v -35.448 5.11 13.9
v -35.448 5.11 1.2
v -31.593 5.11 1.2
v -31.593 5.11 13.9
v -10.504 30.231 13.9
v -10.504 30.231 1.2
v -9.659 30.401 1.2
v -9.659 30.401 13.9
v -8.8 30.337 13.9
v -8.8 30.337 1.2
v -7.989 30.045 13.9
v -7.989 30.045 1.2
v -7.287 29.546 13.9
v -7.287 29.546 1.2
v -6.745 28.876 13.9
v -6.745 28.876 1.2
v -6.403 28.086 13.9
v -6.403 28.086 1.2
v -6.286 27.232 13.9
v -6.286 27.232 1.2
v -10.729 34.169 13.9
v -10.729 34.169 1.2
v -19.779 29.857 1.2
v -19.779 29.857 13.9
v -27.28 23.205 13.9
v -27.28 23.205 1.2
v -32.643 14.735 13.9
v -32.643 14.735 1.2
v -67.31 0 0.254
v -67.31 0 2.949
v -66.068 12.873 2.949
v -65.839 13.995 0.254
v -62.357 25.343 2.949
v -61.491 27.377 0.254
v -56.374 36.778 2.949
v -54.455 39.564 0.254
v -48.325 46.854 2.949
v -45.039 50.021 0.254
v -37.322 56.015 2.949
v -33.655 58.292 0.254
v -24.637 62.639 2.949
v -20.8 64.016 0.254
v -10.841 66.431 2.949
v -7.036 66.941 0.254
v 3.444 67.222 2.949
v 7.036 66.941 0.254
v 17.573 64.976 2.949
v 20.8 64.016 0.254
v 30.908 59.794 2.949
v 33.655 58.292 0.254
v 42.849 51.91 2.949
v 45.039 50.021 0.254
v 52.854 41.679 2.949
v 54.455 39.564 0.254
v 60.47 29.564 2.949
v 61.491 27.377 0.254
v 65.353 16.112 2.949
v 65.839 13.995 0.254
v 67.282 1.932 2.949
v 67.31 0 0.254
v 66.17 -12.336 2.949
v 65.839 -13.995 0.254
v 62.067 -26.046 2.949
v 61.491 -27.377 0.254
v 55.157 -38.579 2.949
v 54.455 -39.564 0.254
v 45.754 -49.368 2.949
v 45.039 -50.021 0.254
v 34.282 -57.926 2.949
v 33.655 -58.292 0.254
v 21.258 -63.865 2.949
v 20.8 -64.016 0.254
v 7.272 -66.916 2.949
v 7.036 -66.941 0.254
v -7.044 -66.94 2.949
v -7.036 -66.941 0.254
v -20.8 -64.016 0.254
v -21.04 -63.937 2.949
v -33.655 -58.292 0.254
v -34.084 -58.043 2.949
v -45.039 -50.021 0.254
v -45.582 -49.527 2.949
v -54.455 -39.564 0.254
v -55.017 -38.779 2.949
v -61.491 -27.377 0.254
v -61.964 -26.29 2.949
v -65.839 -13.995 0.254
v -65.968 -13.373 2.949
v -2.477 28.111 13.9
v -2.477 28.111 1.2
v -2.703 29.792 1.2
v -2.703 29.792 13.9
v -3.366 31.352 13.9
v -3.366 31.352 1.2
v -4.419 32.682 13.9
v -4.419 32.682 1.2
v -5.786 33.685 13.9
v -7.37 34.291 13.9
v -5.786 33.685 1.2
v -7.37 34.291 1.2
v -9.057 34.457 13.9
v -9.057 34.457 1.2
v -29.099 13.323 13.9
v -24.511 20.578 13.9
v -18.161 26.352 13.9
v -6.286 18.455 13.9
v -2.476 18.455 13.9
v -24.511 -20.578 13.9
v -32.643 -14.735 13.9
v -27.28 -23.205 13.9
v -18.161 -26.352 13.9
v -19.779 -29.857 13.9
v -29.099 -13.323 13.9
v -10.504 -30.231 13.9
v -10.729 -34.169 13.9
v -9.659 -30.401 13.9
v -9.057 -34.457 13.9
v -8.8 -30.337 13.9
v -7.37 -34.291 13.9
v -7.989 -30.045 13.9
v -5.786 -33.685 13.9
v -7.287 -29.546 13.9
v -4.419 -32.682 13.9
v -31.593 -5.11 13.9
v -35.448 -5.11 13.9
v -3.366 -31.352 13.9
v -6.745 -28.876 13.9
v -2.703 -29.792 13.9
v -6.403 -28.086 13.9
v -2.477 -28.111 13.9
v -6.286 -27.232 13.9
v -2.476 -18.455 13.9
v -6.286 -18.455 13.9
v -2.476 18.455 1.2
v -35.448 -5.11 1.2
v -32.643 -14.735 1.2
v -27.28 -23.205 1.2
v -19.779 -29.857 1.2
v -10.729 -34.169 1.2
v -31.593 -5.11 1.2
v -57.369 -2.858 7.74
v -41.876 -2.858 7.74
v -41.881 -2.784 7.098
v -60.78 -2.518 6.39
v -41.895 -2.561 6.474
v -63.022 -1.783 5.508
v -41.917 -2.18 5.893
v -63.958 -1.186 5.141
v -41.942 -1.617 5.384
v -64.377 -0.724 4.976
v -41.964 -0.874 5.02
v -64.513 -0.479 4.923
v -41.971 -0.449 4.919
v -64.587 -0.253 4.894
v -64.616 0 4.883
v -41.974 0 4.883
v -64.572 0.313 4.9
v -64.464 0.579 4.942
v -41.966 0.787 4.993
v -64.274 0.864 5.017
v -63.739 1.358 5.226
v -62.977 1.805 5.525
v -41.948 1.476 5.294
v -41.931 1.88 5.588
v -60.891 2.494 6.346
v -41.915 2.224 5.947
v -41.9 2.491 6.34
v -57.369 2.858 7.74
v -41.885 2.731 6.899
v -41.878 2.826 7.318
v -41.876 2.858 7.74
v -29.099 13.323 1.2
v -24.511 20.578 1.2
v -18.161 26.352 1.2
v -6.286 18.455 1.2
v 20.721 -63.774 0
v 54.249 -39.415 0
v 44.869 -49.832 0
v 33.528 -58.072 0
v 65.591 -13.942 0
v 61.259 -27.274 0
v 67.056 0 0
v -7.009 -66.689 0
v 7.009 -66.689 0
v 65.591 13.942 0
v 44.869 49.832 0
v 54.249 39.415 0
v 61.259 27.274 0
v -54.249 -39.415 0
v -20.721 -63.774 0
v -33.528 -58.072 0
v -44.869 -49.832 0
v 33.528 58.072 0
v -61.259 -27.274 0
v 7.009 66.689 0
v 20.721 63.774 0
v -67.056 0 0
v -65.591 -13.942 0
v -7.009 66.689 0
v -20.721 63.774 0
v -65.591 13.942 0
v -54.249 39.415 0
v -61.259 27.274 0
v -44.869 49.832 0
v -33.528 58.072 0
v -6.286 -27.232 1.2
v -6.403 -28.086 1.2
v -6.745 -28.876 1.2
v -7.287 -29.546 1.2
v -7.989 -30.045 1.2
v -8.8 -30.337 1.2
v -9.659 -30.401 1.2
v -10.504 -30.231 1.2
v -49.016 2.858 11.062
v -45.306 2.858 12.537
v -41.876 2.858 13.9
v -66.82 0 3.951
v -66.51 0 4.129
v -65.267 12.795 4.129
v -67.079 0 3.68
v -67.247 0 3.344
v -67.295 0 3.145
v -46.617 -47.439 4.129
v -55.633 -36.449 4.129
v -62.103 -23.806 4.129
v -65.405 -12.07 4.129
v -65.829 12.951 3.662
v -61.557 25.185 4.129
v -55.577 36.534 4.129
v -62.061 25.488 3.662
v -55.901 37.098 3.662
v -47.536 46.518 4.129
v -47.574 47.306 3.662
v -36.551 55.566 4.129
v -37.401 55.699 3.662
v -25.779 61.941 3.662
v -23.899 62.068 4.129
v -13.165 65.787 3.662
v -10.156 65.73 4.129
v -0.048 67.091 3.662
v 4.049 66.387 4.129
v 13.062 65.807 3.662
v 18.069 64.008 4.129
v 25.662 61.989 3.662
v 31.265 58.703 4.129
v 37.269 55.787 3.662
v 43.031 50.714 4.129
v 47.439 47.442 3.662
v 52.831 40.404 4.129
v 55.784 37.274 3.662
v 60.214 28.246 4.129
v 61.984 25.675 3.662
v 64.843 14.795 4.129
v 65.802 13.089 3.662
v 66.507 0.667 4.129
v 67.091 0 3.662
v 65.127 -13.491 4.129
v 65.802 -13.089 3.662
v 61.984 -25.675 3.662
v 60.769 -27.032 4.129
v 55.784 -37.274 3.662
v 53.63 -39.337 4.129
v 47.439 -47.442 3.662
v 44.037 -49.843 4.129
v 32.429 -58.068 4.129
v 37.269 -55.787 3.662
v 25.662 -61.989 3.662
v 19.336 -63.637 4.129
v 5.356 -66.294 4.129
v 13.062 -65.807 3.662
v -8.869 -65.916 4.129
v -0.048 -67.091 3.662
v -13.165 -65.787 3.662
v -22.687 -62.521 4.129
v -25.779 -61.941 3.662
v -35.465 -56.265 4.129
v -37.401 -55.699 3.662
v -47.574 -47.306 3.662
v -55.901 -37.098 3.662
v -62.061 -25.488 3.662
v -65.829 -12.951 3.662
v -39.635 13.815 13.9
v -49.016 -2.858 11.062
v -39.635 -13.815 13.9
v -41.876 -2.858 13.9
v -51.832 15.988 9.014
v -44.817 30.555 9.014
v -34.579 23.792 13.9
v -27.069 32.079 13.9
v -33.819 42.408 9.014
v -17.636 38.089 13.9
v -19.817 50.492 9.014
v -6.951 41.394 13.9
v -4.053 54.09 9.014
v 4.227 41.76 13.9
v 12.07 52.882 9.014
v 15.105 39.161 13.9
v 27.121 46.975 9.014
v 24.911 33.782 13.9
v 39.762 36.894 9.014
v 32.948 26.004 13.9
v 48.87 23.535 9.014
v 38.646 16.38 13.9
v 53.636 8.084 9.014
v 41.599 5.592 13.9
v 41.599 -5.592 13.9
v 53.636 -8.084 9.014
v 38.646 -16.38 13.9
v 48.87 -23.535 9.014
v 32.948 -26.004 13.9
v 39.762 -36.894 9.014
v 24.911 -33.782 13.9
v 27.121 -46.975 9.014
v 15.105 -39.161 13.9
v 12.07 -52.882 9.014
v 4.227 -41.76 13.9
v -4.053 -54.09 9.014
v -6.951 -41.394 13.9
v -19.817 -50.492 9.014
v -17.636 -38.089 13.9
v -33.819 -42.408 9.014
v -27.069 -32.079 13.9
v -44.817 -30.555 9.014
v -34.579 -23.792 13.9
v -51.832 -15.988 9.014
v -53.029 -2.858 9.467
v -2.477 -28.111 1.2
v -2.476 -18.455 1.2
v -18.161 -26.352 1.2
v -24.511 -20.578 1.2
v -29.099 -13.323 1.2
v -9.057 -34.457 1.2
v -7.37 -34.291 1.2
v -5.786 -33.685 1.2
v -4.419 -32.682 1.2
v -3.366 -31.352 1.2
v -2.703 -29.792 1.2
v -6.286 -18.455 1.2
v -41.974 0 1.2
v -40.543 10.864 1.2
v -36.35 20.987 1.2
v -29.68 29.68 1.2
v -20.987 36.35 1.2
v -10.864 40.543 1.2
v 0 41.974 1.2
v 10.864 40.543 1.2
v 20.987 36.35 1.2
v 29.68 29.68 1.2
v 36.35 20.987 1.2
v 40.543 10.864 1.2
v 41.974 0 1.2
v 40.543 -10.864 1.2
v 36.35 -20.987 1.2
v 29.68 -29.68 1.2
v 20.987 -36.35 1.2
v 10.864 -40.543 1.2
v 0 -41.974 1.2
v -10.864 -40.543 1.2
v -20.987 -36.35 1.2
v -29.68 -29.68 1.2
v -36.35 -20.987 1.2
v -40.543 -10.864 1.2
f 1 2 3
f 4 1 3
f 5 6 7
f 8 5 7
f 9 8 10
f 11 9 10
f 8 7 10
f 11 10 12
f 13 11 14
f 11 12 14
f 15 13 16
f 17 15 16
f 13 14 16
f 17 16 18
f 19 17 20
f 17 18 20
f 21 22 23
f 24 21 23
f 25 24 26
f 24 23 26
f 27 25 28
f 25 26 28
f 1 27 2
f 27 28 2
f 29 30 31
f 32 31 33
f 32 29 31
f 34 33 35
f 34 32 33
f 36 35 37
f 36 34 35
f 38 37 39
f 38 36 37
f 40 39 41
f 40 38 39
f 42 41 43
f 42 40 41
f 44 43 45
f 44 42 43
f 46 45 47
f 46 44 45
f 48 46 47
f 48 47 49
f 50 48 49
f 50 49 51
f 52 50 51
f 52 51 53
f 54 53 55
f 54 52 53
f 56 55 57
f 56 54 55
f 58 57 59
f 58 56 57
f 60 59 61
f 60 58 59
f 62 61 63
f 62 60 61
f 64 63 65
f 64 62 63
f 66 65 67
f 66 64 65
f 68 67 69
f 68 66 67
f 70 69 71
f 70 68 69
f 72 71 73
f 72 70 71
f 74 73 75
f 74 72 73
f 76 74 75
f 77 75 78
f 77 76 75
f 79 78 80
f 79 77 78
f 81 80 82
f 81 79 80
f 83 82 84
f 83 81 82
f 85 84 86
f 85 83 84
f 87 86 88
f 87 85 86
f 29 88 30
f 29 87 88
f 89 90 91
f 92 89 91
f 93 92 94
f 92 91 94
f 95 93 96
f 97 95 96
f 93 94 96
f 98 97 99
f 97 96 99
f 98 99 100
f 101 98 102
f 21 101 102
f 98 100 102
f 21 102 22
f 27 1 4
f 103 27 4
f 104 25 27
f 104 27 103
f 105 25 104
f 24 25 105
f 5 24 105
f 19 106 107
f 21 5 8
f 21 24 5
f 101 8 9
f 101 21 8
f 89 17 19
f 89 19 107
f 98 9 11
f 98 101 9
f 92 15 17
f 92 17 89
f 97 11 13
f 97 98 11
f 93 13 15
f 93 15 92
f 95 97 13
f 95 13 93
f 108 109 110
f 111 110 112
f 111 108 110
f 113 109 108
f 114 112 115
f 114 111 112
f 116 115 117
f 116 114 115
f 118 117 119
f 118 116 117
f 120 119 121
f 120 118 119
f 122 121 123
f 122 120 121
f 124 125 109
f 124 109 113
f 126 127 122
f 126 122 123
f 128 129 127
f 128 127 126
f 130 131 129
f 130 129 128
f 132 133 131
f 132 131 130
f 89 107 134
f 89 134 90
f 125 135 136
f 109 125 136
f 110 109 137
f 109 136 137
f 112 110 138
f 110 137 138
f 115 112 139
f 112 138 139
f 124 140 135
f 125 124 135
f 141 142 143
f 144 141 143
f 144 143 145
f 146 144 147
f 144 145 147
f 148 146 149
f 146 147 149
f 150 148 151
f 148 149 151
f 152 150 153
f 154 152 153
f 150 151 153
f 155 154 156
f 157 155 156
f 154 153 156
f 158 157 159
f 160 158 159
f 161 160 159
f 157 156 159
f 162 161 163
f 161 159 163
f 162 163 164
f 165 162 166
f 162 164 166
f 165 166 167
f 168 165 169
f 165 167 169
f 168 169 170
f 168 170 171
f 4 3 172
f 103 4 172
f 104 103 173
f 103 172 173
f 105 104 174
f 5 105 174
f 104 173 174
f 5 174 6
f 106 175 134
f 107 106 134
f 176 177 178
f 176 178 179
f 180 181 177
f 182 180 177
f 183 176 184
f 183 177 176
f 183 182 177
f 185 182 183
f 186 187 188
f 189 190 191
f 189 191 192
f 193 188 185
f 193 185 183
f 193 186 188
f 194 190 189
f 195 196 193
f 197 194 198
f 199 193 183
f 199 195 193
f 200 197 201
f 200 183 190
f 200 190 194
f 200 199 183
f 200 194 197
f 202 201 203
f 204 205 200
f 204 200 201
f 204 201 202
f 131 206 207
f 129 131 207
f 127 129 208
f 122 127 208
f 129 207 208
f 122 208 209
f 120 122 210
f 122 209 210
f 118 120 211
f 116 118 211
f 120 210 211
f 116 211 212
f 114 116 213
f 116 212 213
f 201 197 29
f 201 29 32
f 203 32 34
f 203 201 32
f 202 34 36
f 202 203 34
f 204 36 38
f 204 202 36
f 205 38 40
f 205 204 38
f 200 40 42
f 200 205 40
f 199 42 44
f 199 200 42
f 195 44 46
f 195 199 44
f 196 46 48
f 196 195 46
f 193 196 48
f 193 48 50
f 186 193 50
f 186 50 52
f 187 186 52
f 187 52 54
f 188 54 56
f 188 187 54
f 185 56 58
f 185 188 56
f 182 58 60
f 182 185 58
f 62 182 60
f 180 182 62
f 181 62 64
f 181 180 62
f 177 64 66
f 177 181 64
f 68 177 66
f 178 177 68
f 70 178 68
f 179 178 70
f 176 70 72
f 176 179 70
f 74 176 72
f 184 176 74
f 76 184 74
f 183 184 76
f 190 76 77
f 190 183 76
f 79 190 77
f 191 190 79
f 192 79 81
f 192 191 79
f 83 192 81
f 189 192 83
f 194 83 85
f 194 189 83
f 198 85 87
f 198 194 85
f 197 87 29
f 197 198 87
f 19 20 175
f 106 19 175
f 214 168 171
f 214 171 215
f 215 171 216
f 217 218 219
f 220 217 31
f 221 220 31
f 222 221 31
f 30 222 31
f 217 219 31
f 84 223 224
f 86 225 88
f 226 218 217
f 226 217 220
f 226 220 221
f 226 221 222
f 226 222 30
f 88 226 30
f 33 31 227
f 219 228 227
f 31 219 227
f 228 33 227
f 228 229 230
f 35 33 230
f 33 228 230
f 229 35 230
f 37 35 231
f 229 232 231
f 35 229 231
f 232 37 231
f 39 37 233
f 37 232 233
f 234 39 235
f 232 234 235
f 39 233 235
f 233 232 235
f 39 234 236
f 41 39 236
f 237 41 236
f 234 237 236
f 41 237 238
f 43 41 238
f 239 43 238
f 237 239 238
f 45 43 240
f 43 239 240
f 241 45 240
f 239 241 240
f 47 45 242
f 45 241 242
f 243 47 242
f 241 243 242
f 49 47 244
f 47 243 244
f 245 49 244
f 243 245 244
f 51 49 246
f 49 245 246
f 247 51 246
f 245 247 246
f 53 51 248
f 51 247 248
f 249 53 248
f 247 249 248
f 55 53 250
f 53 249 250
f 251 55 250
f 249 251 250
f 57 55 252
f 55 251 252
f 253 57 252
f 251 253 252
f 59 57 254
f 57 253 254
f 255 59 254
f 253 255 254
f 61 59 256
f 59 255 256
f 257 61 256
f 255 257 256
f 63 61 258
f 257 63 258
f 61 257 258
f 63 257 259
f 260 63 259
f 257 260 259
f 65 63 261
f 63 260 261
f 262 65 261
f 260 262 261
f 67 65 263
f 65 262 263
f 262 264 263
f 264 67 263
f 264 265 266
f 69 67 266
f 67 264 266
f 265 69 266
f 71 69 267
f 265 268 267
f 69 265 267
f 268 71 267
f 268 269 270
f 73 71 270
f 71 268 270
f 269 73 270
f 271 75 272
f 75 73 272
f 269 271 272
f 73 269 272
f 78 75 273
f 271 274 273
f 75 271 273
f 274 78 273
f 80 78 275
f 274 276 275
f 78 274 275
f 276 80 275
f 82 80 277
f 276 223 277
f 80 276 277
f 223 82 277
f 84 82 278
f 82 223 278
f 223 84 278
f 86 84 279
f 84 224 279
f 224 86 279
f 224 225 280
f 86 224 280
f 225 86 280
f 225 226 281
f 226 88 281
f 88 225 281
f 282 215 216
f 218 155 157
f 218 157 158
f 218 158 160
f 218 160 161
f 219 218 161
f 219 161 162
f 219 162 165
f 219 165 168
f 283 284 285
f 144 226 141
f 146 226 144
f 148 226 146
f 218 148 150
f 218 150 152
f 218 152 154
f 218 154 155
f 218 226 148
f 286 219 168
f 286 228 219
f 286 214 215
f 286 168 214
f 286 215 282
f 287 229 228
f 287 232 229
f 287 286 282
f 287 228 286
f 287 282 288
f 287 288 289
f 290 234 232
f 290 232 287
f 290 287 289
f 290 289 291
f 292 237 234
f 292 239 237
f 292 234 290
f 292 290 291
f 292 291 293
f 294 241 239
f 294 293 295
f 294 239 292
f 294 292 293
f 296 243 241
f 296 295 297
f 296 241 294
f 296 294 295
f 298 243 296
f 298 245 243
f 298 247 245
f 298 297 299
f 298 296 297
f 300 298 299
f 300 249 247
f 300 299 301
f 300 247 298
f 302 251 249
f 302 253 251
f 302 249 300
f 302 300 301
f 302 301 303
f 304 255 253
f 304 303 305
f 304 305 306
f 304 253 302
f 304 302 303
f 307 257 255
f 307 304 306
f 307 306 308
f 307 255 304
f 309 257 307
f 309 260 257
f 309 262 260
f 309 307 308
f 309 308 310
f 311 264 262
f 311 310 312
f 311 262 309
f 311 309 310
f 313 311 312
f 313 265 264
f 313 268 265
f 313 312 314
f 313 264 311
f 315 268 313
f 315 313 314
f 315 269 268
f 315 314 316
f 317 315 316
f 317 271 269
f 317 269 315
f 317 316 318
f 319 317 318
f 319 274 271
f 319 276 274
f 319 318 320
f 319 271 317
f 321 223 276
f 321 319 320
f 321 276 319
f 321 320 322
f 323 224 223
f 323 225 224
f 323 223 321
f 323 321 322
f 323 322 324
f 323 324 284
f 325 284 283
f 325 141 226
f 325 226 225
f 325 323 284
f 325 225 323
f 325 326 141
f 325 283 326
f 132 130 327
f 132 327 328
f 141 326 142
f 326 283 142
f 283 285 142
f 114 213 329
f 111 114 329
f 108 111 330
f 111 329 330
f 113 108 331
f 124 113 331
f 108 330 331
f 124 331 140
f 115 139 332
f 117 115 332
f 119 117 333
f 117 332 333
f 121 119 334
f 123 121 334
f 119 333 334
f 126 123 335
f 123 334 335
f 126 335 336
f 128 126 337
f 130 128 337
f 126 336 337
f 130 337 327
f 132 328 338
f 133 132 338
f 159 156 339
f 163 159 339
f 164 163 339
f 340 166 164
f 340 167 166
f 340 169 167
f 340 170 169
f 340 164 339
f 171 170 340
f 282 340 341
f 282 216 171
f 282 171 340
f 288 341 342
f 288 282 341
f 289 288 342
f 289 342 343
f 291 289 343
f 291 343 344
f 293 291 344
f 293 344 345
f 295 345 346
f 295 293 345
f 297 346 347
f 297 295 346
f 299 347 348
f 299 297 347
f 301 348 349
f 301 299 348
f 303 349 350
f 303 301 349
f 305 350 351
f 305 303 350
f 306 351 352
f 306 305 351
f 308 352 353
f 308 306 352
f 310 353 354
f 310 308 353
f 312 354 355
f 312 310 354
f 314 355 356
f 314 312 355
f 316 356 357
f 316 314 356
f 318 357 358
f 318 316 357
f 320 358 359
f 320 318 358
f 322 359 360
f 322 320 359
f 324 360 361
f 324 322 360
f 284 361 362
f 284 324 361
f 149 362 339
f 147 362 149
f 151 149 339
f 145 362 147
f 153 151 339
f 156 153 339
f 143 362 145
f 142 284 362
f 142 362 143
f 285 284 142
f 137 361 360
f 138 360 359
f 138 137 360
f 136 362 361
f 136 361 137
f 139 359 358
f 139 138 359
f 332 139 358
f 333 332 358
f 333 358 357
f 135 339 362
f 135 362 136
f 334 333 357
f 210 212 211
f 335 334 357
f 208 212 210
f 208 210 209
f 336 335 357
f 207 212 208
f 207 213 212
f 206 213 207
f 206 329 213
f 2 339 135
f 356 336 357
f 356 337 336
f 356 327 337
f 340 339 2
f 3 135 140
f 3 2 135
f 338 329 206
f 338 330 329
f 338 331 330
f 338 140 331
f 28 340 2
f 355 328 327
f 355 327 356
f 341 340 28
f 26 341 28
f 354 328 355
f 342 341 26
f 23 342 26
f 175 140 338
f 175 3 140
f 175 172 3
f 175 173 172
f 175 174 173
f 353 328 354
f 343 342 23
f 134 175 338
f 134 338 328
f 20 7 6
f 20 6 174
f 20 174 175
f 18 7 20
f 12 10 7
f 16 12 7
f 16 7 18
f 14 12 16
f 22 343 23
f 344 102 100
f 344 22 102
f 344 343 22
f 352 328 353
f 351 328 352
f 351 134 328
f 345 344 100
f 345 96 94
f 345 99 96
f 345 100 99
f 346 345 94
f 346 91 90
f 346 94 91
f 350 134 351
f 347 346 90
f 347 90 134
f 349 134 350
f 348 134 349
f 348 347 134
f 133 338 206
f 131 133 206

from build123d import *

# Parameters (mm, degrees)
F2_R     = 1.27
F4_DEPTH = 12.7
F6_DEPTH = 127
F7_SIZE  = 0.254


with BuildPart() as f1:
    # F0 (on Front) → F1 (revolve)
    with BuildSketch(Plane.XZ):
        Polygon((-67.31, 0), (0, 0), (0, 1.2), (-41.9735, 1.2), (-41.9735, 13.9), (-67.31, 3.81), align=None)
    revolve(axis=Axis((0, 0, 6.192707), (0, 0, -1)))

    # F2
    f2_edges = [f1.edges().sort_by_distance(p)[0] for p in [
        (67.31, 0, 3.81),
    ]]
    fillet(f2_edges, radius=F2_R)

    # F3 (on face) → F4 (join)
    with BuildSketch(Plane.XY.offset(1.2)):
        with BuildLine():
            ThreePointArc((-2.4765, 28.110855), (-5.068633, 33.22954), (-10.728763, 34.169229))
            ThreePointArc((-10.728763, 34.169229), (-27.279607, 23.204862), (-35.447604, 5.10979))
            Line((-35.447604, 5.10979), (-31.59345, 5.10979))
            ThreePointArc((-31.59345, 5.10979), (-24.511453, 20.577772), (-10.503515, 30.231311))
            ThreePointArc((-10.503515, 30.231311), (-7.621361, 29.819549), (-6.2865, 27.232173))
            Line((-6.2865, 27.232173), (-6.2865, 18.455401))
            Line((-6.2865, 18.455401), (-2.4765, 18.455401))
            Line((-2.4765, 18.455401), (-2.4765, 28.110855))
        make_face()
        with BuildLine():
            ThreePointArc((-35.447604, -5.10979), (-27.279607, -23.204862), (-10.728763, -34.169229))
            ThreePointArc((-10.728763, -34.169229), (-5.068633, -33.22954), (-2.4765, -28.110855))
            Line((-2.4765, -28.110855), (-2.4765, -18.455401))
            Line((-2.4765, -18.455401), (-6.2865, -18.455401))
            Line((-6.2865, -18.455401), (-6.2865, -27.232173))
            ThreePointArc((-6.2865, -27.232173), (-7.621361, -29.819549), (-10.503515, -30.231311))
            ThreePointArc((-10.503515, -30.231311), (-24.511453, -20.577772), (-31.59345, -5.10979))
            Line((-31.59345, -5.10979), (-35.447604, -5.10979))
        make_face()
    extrude(amount=F4_DEPTH)

    # F5 (on Right) → F6 (cut)
    with BuildSketch(Plane.YZ):
        with BuildLine():
            Line((2.8575, 13.9), (-2.8575, 13.9))
            Line((-2.8575, 13.9), (-2.8575, 7.7405))
            ThreePointArc((-2.8575, 7.7405), (0, 4.883), (2.8575, 7.7405))
            Line((2.8575, 7.7405), (2.8575, 13.9))
        make_face()
    extrude(amount=-F6_DEPTH, mode=Mode.SUBTRACT)

    # F7
    f7_edges = [f1.edges().sort_by_distance(p)[0] for p in [
        (67.31, 0, 0),
    ]]
    chamfer(f7_edges, length=F7_SIZE)


solid = f1.part
